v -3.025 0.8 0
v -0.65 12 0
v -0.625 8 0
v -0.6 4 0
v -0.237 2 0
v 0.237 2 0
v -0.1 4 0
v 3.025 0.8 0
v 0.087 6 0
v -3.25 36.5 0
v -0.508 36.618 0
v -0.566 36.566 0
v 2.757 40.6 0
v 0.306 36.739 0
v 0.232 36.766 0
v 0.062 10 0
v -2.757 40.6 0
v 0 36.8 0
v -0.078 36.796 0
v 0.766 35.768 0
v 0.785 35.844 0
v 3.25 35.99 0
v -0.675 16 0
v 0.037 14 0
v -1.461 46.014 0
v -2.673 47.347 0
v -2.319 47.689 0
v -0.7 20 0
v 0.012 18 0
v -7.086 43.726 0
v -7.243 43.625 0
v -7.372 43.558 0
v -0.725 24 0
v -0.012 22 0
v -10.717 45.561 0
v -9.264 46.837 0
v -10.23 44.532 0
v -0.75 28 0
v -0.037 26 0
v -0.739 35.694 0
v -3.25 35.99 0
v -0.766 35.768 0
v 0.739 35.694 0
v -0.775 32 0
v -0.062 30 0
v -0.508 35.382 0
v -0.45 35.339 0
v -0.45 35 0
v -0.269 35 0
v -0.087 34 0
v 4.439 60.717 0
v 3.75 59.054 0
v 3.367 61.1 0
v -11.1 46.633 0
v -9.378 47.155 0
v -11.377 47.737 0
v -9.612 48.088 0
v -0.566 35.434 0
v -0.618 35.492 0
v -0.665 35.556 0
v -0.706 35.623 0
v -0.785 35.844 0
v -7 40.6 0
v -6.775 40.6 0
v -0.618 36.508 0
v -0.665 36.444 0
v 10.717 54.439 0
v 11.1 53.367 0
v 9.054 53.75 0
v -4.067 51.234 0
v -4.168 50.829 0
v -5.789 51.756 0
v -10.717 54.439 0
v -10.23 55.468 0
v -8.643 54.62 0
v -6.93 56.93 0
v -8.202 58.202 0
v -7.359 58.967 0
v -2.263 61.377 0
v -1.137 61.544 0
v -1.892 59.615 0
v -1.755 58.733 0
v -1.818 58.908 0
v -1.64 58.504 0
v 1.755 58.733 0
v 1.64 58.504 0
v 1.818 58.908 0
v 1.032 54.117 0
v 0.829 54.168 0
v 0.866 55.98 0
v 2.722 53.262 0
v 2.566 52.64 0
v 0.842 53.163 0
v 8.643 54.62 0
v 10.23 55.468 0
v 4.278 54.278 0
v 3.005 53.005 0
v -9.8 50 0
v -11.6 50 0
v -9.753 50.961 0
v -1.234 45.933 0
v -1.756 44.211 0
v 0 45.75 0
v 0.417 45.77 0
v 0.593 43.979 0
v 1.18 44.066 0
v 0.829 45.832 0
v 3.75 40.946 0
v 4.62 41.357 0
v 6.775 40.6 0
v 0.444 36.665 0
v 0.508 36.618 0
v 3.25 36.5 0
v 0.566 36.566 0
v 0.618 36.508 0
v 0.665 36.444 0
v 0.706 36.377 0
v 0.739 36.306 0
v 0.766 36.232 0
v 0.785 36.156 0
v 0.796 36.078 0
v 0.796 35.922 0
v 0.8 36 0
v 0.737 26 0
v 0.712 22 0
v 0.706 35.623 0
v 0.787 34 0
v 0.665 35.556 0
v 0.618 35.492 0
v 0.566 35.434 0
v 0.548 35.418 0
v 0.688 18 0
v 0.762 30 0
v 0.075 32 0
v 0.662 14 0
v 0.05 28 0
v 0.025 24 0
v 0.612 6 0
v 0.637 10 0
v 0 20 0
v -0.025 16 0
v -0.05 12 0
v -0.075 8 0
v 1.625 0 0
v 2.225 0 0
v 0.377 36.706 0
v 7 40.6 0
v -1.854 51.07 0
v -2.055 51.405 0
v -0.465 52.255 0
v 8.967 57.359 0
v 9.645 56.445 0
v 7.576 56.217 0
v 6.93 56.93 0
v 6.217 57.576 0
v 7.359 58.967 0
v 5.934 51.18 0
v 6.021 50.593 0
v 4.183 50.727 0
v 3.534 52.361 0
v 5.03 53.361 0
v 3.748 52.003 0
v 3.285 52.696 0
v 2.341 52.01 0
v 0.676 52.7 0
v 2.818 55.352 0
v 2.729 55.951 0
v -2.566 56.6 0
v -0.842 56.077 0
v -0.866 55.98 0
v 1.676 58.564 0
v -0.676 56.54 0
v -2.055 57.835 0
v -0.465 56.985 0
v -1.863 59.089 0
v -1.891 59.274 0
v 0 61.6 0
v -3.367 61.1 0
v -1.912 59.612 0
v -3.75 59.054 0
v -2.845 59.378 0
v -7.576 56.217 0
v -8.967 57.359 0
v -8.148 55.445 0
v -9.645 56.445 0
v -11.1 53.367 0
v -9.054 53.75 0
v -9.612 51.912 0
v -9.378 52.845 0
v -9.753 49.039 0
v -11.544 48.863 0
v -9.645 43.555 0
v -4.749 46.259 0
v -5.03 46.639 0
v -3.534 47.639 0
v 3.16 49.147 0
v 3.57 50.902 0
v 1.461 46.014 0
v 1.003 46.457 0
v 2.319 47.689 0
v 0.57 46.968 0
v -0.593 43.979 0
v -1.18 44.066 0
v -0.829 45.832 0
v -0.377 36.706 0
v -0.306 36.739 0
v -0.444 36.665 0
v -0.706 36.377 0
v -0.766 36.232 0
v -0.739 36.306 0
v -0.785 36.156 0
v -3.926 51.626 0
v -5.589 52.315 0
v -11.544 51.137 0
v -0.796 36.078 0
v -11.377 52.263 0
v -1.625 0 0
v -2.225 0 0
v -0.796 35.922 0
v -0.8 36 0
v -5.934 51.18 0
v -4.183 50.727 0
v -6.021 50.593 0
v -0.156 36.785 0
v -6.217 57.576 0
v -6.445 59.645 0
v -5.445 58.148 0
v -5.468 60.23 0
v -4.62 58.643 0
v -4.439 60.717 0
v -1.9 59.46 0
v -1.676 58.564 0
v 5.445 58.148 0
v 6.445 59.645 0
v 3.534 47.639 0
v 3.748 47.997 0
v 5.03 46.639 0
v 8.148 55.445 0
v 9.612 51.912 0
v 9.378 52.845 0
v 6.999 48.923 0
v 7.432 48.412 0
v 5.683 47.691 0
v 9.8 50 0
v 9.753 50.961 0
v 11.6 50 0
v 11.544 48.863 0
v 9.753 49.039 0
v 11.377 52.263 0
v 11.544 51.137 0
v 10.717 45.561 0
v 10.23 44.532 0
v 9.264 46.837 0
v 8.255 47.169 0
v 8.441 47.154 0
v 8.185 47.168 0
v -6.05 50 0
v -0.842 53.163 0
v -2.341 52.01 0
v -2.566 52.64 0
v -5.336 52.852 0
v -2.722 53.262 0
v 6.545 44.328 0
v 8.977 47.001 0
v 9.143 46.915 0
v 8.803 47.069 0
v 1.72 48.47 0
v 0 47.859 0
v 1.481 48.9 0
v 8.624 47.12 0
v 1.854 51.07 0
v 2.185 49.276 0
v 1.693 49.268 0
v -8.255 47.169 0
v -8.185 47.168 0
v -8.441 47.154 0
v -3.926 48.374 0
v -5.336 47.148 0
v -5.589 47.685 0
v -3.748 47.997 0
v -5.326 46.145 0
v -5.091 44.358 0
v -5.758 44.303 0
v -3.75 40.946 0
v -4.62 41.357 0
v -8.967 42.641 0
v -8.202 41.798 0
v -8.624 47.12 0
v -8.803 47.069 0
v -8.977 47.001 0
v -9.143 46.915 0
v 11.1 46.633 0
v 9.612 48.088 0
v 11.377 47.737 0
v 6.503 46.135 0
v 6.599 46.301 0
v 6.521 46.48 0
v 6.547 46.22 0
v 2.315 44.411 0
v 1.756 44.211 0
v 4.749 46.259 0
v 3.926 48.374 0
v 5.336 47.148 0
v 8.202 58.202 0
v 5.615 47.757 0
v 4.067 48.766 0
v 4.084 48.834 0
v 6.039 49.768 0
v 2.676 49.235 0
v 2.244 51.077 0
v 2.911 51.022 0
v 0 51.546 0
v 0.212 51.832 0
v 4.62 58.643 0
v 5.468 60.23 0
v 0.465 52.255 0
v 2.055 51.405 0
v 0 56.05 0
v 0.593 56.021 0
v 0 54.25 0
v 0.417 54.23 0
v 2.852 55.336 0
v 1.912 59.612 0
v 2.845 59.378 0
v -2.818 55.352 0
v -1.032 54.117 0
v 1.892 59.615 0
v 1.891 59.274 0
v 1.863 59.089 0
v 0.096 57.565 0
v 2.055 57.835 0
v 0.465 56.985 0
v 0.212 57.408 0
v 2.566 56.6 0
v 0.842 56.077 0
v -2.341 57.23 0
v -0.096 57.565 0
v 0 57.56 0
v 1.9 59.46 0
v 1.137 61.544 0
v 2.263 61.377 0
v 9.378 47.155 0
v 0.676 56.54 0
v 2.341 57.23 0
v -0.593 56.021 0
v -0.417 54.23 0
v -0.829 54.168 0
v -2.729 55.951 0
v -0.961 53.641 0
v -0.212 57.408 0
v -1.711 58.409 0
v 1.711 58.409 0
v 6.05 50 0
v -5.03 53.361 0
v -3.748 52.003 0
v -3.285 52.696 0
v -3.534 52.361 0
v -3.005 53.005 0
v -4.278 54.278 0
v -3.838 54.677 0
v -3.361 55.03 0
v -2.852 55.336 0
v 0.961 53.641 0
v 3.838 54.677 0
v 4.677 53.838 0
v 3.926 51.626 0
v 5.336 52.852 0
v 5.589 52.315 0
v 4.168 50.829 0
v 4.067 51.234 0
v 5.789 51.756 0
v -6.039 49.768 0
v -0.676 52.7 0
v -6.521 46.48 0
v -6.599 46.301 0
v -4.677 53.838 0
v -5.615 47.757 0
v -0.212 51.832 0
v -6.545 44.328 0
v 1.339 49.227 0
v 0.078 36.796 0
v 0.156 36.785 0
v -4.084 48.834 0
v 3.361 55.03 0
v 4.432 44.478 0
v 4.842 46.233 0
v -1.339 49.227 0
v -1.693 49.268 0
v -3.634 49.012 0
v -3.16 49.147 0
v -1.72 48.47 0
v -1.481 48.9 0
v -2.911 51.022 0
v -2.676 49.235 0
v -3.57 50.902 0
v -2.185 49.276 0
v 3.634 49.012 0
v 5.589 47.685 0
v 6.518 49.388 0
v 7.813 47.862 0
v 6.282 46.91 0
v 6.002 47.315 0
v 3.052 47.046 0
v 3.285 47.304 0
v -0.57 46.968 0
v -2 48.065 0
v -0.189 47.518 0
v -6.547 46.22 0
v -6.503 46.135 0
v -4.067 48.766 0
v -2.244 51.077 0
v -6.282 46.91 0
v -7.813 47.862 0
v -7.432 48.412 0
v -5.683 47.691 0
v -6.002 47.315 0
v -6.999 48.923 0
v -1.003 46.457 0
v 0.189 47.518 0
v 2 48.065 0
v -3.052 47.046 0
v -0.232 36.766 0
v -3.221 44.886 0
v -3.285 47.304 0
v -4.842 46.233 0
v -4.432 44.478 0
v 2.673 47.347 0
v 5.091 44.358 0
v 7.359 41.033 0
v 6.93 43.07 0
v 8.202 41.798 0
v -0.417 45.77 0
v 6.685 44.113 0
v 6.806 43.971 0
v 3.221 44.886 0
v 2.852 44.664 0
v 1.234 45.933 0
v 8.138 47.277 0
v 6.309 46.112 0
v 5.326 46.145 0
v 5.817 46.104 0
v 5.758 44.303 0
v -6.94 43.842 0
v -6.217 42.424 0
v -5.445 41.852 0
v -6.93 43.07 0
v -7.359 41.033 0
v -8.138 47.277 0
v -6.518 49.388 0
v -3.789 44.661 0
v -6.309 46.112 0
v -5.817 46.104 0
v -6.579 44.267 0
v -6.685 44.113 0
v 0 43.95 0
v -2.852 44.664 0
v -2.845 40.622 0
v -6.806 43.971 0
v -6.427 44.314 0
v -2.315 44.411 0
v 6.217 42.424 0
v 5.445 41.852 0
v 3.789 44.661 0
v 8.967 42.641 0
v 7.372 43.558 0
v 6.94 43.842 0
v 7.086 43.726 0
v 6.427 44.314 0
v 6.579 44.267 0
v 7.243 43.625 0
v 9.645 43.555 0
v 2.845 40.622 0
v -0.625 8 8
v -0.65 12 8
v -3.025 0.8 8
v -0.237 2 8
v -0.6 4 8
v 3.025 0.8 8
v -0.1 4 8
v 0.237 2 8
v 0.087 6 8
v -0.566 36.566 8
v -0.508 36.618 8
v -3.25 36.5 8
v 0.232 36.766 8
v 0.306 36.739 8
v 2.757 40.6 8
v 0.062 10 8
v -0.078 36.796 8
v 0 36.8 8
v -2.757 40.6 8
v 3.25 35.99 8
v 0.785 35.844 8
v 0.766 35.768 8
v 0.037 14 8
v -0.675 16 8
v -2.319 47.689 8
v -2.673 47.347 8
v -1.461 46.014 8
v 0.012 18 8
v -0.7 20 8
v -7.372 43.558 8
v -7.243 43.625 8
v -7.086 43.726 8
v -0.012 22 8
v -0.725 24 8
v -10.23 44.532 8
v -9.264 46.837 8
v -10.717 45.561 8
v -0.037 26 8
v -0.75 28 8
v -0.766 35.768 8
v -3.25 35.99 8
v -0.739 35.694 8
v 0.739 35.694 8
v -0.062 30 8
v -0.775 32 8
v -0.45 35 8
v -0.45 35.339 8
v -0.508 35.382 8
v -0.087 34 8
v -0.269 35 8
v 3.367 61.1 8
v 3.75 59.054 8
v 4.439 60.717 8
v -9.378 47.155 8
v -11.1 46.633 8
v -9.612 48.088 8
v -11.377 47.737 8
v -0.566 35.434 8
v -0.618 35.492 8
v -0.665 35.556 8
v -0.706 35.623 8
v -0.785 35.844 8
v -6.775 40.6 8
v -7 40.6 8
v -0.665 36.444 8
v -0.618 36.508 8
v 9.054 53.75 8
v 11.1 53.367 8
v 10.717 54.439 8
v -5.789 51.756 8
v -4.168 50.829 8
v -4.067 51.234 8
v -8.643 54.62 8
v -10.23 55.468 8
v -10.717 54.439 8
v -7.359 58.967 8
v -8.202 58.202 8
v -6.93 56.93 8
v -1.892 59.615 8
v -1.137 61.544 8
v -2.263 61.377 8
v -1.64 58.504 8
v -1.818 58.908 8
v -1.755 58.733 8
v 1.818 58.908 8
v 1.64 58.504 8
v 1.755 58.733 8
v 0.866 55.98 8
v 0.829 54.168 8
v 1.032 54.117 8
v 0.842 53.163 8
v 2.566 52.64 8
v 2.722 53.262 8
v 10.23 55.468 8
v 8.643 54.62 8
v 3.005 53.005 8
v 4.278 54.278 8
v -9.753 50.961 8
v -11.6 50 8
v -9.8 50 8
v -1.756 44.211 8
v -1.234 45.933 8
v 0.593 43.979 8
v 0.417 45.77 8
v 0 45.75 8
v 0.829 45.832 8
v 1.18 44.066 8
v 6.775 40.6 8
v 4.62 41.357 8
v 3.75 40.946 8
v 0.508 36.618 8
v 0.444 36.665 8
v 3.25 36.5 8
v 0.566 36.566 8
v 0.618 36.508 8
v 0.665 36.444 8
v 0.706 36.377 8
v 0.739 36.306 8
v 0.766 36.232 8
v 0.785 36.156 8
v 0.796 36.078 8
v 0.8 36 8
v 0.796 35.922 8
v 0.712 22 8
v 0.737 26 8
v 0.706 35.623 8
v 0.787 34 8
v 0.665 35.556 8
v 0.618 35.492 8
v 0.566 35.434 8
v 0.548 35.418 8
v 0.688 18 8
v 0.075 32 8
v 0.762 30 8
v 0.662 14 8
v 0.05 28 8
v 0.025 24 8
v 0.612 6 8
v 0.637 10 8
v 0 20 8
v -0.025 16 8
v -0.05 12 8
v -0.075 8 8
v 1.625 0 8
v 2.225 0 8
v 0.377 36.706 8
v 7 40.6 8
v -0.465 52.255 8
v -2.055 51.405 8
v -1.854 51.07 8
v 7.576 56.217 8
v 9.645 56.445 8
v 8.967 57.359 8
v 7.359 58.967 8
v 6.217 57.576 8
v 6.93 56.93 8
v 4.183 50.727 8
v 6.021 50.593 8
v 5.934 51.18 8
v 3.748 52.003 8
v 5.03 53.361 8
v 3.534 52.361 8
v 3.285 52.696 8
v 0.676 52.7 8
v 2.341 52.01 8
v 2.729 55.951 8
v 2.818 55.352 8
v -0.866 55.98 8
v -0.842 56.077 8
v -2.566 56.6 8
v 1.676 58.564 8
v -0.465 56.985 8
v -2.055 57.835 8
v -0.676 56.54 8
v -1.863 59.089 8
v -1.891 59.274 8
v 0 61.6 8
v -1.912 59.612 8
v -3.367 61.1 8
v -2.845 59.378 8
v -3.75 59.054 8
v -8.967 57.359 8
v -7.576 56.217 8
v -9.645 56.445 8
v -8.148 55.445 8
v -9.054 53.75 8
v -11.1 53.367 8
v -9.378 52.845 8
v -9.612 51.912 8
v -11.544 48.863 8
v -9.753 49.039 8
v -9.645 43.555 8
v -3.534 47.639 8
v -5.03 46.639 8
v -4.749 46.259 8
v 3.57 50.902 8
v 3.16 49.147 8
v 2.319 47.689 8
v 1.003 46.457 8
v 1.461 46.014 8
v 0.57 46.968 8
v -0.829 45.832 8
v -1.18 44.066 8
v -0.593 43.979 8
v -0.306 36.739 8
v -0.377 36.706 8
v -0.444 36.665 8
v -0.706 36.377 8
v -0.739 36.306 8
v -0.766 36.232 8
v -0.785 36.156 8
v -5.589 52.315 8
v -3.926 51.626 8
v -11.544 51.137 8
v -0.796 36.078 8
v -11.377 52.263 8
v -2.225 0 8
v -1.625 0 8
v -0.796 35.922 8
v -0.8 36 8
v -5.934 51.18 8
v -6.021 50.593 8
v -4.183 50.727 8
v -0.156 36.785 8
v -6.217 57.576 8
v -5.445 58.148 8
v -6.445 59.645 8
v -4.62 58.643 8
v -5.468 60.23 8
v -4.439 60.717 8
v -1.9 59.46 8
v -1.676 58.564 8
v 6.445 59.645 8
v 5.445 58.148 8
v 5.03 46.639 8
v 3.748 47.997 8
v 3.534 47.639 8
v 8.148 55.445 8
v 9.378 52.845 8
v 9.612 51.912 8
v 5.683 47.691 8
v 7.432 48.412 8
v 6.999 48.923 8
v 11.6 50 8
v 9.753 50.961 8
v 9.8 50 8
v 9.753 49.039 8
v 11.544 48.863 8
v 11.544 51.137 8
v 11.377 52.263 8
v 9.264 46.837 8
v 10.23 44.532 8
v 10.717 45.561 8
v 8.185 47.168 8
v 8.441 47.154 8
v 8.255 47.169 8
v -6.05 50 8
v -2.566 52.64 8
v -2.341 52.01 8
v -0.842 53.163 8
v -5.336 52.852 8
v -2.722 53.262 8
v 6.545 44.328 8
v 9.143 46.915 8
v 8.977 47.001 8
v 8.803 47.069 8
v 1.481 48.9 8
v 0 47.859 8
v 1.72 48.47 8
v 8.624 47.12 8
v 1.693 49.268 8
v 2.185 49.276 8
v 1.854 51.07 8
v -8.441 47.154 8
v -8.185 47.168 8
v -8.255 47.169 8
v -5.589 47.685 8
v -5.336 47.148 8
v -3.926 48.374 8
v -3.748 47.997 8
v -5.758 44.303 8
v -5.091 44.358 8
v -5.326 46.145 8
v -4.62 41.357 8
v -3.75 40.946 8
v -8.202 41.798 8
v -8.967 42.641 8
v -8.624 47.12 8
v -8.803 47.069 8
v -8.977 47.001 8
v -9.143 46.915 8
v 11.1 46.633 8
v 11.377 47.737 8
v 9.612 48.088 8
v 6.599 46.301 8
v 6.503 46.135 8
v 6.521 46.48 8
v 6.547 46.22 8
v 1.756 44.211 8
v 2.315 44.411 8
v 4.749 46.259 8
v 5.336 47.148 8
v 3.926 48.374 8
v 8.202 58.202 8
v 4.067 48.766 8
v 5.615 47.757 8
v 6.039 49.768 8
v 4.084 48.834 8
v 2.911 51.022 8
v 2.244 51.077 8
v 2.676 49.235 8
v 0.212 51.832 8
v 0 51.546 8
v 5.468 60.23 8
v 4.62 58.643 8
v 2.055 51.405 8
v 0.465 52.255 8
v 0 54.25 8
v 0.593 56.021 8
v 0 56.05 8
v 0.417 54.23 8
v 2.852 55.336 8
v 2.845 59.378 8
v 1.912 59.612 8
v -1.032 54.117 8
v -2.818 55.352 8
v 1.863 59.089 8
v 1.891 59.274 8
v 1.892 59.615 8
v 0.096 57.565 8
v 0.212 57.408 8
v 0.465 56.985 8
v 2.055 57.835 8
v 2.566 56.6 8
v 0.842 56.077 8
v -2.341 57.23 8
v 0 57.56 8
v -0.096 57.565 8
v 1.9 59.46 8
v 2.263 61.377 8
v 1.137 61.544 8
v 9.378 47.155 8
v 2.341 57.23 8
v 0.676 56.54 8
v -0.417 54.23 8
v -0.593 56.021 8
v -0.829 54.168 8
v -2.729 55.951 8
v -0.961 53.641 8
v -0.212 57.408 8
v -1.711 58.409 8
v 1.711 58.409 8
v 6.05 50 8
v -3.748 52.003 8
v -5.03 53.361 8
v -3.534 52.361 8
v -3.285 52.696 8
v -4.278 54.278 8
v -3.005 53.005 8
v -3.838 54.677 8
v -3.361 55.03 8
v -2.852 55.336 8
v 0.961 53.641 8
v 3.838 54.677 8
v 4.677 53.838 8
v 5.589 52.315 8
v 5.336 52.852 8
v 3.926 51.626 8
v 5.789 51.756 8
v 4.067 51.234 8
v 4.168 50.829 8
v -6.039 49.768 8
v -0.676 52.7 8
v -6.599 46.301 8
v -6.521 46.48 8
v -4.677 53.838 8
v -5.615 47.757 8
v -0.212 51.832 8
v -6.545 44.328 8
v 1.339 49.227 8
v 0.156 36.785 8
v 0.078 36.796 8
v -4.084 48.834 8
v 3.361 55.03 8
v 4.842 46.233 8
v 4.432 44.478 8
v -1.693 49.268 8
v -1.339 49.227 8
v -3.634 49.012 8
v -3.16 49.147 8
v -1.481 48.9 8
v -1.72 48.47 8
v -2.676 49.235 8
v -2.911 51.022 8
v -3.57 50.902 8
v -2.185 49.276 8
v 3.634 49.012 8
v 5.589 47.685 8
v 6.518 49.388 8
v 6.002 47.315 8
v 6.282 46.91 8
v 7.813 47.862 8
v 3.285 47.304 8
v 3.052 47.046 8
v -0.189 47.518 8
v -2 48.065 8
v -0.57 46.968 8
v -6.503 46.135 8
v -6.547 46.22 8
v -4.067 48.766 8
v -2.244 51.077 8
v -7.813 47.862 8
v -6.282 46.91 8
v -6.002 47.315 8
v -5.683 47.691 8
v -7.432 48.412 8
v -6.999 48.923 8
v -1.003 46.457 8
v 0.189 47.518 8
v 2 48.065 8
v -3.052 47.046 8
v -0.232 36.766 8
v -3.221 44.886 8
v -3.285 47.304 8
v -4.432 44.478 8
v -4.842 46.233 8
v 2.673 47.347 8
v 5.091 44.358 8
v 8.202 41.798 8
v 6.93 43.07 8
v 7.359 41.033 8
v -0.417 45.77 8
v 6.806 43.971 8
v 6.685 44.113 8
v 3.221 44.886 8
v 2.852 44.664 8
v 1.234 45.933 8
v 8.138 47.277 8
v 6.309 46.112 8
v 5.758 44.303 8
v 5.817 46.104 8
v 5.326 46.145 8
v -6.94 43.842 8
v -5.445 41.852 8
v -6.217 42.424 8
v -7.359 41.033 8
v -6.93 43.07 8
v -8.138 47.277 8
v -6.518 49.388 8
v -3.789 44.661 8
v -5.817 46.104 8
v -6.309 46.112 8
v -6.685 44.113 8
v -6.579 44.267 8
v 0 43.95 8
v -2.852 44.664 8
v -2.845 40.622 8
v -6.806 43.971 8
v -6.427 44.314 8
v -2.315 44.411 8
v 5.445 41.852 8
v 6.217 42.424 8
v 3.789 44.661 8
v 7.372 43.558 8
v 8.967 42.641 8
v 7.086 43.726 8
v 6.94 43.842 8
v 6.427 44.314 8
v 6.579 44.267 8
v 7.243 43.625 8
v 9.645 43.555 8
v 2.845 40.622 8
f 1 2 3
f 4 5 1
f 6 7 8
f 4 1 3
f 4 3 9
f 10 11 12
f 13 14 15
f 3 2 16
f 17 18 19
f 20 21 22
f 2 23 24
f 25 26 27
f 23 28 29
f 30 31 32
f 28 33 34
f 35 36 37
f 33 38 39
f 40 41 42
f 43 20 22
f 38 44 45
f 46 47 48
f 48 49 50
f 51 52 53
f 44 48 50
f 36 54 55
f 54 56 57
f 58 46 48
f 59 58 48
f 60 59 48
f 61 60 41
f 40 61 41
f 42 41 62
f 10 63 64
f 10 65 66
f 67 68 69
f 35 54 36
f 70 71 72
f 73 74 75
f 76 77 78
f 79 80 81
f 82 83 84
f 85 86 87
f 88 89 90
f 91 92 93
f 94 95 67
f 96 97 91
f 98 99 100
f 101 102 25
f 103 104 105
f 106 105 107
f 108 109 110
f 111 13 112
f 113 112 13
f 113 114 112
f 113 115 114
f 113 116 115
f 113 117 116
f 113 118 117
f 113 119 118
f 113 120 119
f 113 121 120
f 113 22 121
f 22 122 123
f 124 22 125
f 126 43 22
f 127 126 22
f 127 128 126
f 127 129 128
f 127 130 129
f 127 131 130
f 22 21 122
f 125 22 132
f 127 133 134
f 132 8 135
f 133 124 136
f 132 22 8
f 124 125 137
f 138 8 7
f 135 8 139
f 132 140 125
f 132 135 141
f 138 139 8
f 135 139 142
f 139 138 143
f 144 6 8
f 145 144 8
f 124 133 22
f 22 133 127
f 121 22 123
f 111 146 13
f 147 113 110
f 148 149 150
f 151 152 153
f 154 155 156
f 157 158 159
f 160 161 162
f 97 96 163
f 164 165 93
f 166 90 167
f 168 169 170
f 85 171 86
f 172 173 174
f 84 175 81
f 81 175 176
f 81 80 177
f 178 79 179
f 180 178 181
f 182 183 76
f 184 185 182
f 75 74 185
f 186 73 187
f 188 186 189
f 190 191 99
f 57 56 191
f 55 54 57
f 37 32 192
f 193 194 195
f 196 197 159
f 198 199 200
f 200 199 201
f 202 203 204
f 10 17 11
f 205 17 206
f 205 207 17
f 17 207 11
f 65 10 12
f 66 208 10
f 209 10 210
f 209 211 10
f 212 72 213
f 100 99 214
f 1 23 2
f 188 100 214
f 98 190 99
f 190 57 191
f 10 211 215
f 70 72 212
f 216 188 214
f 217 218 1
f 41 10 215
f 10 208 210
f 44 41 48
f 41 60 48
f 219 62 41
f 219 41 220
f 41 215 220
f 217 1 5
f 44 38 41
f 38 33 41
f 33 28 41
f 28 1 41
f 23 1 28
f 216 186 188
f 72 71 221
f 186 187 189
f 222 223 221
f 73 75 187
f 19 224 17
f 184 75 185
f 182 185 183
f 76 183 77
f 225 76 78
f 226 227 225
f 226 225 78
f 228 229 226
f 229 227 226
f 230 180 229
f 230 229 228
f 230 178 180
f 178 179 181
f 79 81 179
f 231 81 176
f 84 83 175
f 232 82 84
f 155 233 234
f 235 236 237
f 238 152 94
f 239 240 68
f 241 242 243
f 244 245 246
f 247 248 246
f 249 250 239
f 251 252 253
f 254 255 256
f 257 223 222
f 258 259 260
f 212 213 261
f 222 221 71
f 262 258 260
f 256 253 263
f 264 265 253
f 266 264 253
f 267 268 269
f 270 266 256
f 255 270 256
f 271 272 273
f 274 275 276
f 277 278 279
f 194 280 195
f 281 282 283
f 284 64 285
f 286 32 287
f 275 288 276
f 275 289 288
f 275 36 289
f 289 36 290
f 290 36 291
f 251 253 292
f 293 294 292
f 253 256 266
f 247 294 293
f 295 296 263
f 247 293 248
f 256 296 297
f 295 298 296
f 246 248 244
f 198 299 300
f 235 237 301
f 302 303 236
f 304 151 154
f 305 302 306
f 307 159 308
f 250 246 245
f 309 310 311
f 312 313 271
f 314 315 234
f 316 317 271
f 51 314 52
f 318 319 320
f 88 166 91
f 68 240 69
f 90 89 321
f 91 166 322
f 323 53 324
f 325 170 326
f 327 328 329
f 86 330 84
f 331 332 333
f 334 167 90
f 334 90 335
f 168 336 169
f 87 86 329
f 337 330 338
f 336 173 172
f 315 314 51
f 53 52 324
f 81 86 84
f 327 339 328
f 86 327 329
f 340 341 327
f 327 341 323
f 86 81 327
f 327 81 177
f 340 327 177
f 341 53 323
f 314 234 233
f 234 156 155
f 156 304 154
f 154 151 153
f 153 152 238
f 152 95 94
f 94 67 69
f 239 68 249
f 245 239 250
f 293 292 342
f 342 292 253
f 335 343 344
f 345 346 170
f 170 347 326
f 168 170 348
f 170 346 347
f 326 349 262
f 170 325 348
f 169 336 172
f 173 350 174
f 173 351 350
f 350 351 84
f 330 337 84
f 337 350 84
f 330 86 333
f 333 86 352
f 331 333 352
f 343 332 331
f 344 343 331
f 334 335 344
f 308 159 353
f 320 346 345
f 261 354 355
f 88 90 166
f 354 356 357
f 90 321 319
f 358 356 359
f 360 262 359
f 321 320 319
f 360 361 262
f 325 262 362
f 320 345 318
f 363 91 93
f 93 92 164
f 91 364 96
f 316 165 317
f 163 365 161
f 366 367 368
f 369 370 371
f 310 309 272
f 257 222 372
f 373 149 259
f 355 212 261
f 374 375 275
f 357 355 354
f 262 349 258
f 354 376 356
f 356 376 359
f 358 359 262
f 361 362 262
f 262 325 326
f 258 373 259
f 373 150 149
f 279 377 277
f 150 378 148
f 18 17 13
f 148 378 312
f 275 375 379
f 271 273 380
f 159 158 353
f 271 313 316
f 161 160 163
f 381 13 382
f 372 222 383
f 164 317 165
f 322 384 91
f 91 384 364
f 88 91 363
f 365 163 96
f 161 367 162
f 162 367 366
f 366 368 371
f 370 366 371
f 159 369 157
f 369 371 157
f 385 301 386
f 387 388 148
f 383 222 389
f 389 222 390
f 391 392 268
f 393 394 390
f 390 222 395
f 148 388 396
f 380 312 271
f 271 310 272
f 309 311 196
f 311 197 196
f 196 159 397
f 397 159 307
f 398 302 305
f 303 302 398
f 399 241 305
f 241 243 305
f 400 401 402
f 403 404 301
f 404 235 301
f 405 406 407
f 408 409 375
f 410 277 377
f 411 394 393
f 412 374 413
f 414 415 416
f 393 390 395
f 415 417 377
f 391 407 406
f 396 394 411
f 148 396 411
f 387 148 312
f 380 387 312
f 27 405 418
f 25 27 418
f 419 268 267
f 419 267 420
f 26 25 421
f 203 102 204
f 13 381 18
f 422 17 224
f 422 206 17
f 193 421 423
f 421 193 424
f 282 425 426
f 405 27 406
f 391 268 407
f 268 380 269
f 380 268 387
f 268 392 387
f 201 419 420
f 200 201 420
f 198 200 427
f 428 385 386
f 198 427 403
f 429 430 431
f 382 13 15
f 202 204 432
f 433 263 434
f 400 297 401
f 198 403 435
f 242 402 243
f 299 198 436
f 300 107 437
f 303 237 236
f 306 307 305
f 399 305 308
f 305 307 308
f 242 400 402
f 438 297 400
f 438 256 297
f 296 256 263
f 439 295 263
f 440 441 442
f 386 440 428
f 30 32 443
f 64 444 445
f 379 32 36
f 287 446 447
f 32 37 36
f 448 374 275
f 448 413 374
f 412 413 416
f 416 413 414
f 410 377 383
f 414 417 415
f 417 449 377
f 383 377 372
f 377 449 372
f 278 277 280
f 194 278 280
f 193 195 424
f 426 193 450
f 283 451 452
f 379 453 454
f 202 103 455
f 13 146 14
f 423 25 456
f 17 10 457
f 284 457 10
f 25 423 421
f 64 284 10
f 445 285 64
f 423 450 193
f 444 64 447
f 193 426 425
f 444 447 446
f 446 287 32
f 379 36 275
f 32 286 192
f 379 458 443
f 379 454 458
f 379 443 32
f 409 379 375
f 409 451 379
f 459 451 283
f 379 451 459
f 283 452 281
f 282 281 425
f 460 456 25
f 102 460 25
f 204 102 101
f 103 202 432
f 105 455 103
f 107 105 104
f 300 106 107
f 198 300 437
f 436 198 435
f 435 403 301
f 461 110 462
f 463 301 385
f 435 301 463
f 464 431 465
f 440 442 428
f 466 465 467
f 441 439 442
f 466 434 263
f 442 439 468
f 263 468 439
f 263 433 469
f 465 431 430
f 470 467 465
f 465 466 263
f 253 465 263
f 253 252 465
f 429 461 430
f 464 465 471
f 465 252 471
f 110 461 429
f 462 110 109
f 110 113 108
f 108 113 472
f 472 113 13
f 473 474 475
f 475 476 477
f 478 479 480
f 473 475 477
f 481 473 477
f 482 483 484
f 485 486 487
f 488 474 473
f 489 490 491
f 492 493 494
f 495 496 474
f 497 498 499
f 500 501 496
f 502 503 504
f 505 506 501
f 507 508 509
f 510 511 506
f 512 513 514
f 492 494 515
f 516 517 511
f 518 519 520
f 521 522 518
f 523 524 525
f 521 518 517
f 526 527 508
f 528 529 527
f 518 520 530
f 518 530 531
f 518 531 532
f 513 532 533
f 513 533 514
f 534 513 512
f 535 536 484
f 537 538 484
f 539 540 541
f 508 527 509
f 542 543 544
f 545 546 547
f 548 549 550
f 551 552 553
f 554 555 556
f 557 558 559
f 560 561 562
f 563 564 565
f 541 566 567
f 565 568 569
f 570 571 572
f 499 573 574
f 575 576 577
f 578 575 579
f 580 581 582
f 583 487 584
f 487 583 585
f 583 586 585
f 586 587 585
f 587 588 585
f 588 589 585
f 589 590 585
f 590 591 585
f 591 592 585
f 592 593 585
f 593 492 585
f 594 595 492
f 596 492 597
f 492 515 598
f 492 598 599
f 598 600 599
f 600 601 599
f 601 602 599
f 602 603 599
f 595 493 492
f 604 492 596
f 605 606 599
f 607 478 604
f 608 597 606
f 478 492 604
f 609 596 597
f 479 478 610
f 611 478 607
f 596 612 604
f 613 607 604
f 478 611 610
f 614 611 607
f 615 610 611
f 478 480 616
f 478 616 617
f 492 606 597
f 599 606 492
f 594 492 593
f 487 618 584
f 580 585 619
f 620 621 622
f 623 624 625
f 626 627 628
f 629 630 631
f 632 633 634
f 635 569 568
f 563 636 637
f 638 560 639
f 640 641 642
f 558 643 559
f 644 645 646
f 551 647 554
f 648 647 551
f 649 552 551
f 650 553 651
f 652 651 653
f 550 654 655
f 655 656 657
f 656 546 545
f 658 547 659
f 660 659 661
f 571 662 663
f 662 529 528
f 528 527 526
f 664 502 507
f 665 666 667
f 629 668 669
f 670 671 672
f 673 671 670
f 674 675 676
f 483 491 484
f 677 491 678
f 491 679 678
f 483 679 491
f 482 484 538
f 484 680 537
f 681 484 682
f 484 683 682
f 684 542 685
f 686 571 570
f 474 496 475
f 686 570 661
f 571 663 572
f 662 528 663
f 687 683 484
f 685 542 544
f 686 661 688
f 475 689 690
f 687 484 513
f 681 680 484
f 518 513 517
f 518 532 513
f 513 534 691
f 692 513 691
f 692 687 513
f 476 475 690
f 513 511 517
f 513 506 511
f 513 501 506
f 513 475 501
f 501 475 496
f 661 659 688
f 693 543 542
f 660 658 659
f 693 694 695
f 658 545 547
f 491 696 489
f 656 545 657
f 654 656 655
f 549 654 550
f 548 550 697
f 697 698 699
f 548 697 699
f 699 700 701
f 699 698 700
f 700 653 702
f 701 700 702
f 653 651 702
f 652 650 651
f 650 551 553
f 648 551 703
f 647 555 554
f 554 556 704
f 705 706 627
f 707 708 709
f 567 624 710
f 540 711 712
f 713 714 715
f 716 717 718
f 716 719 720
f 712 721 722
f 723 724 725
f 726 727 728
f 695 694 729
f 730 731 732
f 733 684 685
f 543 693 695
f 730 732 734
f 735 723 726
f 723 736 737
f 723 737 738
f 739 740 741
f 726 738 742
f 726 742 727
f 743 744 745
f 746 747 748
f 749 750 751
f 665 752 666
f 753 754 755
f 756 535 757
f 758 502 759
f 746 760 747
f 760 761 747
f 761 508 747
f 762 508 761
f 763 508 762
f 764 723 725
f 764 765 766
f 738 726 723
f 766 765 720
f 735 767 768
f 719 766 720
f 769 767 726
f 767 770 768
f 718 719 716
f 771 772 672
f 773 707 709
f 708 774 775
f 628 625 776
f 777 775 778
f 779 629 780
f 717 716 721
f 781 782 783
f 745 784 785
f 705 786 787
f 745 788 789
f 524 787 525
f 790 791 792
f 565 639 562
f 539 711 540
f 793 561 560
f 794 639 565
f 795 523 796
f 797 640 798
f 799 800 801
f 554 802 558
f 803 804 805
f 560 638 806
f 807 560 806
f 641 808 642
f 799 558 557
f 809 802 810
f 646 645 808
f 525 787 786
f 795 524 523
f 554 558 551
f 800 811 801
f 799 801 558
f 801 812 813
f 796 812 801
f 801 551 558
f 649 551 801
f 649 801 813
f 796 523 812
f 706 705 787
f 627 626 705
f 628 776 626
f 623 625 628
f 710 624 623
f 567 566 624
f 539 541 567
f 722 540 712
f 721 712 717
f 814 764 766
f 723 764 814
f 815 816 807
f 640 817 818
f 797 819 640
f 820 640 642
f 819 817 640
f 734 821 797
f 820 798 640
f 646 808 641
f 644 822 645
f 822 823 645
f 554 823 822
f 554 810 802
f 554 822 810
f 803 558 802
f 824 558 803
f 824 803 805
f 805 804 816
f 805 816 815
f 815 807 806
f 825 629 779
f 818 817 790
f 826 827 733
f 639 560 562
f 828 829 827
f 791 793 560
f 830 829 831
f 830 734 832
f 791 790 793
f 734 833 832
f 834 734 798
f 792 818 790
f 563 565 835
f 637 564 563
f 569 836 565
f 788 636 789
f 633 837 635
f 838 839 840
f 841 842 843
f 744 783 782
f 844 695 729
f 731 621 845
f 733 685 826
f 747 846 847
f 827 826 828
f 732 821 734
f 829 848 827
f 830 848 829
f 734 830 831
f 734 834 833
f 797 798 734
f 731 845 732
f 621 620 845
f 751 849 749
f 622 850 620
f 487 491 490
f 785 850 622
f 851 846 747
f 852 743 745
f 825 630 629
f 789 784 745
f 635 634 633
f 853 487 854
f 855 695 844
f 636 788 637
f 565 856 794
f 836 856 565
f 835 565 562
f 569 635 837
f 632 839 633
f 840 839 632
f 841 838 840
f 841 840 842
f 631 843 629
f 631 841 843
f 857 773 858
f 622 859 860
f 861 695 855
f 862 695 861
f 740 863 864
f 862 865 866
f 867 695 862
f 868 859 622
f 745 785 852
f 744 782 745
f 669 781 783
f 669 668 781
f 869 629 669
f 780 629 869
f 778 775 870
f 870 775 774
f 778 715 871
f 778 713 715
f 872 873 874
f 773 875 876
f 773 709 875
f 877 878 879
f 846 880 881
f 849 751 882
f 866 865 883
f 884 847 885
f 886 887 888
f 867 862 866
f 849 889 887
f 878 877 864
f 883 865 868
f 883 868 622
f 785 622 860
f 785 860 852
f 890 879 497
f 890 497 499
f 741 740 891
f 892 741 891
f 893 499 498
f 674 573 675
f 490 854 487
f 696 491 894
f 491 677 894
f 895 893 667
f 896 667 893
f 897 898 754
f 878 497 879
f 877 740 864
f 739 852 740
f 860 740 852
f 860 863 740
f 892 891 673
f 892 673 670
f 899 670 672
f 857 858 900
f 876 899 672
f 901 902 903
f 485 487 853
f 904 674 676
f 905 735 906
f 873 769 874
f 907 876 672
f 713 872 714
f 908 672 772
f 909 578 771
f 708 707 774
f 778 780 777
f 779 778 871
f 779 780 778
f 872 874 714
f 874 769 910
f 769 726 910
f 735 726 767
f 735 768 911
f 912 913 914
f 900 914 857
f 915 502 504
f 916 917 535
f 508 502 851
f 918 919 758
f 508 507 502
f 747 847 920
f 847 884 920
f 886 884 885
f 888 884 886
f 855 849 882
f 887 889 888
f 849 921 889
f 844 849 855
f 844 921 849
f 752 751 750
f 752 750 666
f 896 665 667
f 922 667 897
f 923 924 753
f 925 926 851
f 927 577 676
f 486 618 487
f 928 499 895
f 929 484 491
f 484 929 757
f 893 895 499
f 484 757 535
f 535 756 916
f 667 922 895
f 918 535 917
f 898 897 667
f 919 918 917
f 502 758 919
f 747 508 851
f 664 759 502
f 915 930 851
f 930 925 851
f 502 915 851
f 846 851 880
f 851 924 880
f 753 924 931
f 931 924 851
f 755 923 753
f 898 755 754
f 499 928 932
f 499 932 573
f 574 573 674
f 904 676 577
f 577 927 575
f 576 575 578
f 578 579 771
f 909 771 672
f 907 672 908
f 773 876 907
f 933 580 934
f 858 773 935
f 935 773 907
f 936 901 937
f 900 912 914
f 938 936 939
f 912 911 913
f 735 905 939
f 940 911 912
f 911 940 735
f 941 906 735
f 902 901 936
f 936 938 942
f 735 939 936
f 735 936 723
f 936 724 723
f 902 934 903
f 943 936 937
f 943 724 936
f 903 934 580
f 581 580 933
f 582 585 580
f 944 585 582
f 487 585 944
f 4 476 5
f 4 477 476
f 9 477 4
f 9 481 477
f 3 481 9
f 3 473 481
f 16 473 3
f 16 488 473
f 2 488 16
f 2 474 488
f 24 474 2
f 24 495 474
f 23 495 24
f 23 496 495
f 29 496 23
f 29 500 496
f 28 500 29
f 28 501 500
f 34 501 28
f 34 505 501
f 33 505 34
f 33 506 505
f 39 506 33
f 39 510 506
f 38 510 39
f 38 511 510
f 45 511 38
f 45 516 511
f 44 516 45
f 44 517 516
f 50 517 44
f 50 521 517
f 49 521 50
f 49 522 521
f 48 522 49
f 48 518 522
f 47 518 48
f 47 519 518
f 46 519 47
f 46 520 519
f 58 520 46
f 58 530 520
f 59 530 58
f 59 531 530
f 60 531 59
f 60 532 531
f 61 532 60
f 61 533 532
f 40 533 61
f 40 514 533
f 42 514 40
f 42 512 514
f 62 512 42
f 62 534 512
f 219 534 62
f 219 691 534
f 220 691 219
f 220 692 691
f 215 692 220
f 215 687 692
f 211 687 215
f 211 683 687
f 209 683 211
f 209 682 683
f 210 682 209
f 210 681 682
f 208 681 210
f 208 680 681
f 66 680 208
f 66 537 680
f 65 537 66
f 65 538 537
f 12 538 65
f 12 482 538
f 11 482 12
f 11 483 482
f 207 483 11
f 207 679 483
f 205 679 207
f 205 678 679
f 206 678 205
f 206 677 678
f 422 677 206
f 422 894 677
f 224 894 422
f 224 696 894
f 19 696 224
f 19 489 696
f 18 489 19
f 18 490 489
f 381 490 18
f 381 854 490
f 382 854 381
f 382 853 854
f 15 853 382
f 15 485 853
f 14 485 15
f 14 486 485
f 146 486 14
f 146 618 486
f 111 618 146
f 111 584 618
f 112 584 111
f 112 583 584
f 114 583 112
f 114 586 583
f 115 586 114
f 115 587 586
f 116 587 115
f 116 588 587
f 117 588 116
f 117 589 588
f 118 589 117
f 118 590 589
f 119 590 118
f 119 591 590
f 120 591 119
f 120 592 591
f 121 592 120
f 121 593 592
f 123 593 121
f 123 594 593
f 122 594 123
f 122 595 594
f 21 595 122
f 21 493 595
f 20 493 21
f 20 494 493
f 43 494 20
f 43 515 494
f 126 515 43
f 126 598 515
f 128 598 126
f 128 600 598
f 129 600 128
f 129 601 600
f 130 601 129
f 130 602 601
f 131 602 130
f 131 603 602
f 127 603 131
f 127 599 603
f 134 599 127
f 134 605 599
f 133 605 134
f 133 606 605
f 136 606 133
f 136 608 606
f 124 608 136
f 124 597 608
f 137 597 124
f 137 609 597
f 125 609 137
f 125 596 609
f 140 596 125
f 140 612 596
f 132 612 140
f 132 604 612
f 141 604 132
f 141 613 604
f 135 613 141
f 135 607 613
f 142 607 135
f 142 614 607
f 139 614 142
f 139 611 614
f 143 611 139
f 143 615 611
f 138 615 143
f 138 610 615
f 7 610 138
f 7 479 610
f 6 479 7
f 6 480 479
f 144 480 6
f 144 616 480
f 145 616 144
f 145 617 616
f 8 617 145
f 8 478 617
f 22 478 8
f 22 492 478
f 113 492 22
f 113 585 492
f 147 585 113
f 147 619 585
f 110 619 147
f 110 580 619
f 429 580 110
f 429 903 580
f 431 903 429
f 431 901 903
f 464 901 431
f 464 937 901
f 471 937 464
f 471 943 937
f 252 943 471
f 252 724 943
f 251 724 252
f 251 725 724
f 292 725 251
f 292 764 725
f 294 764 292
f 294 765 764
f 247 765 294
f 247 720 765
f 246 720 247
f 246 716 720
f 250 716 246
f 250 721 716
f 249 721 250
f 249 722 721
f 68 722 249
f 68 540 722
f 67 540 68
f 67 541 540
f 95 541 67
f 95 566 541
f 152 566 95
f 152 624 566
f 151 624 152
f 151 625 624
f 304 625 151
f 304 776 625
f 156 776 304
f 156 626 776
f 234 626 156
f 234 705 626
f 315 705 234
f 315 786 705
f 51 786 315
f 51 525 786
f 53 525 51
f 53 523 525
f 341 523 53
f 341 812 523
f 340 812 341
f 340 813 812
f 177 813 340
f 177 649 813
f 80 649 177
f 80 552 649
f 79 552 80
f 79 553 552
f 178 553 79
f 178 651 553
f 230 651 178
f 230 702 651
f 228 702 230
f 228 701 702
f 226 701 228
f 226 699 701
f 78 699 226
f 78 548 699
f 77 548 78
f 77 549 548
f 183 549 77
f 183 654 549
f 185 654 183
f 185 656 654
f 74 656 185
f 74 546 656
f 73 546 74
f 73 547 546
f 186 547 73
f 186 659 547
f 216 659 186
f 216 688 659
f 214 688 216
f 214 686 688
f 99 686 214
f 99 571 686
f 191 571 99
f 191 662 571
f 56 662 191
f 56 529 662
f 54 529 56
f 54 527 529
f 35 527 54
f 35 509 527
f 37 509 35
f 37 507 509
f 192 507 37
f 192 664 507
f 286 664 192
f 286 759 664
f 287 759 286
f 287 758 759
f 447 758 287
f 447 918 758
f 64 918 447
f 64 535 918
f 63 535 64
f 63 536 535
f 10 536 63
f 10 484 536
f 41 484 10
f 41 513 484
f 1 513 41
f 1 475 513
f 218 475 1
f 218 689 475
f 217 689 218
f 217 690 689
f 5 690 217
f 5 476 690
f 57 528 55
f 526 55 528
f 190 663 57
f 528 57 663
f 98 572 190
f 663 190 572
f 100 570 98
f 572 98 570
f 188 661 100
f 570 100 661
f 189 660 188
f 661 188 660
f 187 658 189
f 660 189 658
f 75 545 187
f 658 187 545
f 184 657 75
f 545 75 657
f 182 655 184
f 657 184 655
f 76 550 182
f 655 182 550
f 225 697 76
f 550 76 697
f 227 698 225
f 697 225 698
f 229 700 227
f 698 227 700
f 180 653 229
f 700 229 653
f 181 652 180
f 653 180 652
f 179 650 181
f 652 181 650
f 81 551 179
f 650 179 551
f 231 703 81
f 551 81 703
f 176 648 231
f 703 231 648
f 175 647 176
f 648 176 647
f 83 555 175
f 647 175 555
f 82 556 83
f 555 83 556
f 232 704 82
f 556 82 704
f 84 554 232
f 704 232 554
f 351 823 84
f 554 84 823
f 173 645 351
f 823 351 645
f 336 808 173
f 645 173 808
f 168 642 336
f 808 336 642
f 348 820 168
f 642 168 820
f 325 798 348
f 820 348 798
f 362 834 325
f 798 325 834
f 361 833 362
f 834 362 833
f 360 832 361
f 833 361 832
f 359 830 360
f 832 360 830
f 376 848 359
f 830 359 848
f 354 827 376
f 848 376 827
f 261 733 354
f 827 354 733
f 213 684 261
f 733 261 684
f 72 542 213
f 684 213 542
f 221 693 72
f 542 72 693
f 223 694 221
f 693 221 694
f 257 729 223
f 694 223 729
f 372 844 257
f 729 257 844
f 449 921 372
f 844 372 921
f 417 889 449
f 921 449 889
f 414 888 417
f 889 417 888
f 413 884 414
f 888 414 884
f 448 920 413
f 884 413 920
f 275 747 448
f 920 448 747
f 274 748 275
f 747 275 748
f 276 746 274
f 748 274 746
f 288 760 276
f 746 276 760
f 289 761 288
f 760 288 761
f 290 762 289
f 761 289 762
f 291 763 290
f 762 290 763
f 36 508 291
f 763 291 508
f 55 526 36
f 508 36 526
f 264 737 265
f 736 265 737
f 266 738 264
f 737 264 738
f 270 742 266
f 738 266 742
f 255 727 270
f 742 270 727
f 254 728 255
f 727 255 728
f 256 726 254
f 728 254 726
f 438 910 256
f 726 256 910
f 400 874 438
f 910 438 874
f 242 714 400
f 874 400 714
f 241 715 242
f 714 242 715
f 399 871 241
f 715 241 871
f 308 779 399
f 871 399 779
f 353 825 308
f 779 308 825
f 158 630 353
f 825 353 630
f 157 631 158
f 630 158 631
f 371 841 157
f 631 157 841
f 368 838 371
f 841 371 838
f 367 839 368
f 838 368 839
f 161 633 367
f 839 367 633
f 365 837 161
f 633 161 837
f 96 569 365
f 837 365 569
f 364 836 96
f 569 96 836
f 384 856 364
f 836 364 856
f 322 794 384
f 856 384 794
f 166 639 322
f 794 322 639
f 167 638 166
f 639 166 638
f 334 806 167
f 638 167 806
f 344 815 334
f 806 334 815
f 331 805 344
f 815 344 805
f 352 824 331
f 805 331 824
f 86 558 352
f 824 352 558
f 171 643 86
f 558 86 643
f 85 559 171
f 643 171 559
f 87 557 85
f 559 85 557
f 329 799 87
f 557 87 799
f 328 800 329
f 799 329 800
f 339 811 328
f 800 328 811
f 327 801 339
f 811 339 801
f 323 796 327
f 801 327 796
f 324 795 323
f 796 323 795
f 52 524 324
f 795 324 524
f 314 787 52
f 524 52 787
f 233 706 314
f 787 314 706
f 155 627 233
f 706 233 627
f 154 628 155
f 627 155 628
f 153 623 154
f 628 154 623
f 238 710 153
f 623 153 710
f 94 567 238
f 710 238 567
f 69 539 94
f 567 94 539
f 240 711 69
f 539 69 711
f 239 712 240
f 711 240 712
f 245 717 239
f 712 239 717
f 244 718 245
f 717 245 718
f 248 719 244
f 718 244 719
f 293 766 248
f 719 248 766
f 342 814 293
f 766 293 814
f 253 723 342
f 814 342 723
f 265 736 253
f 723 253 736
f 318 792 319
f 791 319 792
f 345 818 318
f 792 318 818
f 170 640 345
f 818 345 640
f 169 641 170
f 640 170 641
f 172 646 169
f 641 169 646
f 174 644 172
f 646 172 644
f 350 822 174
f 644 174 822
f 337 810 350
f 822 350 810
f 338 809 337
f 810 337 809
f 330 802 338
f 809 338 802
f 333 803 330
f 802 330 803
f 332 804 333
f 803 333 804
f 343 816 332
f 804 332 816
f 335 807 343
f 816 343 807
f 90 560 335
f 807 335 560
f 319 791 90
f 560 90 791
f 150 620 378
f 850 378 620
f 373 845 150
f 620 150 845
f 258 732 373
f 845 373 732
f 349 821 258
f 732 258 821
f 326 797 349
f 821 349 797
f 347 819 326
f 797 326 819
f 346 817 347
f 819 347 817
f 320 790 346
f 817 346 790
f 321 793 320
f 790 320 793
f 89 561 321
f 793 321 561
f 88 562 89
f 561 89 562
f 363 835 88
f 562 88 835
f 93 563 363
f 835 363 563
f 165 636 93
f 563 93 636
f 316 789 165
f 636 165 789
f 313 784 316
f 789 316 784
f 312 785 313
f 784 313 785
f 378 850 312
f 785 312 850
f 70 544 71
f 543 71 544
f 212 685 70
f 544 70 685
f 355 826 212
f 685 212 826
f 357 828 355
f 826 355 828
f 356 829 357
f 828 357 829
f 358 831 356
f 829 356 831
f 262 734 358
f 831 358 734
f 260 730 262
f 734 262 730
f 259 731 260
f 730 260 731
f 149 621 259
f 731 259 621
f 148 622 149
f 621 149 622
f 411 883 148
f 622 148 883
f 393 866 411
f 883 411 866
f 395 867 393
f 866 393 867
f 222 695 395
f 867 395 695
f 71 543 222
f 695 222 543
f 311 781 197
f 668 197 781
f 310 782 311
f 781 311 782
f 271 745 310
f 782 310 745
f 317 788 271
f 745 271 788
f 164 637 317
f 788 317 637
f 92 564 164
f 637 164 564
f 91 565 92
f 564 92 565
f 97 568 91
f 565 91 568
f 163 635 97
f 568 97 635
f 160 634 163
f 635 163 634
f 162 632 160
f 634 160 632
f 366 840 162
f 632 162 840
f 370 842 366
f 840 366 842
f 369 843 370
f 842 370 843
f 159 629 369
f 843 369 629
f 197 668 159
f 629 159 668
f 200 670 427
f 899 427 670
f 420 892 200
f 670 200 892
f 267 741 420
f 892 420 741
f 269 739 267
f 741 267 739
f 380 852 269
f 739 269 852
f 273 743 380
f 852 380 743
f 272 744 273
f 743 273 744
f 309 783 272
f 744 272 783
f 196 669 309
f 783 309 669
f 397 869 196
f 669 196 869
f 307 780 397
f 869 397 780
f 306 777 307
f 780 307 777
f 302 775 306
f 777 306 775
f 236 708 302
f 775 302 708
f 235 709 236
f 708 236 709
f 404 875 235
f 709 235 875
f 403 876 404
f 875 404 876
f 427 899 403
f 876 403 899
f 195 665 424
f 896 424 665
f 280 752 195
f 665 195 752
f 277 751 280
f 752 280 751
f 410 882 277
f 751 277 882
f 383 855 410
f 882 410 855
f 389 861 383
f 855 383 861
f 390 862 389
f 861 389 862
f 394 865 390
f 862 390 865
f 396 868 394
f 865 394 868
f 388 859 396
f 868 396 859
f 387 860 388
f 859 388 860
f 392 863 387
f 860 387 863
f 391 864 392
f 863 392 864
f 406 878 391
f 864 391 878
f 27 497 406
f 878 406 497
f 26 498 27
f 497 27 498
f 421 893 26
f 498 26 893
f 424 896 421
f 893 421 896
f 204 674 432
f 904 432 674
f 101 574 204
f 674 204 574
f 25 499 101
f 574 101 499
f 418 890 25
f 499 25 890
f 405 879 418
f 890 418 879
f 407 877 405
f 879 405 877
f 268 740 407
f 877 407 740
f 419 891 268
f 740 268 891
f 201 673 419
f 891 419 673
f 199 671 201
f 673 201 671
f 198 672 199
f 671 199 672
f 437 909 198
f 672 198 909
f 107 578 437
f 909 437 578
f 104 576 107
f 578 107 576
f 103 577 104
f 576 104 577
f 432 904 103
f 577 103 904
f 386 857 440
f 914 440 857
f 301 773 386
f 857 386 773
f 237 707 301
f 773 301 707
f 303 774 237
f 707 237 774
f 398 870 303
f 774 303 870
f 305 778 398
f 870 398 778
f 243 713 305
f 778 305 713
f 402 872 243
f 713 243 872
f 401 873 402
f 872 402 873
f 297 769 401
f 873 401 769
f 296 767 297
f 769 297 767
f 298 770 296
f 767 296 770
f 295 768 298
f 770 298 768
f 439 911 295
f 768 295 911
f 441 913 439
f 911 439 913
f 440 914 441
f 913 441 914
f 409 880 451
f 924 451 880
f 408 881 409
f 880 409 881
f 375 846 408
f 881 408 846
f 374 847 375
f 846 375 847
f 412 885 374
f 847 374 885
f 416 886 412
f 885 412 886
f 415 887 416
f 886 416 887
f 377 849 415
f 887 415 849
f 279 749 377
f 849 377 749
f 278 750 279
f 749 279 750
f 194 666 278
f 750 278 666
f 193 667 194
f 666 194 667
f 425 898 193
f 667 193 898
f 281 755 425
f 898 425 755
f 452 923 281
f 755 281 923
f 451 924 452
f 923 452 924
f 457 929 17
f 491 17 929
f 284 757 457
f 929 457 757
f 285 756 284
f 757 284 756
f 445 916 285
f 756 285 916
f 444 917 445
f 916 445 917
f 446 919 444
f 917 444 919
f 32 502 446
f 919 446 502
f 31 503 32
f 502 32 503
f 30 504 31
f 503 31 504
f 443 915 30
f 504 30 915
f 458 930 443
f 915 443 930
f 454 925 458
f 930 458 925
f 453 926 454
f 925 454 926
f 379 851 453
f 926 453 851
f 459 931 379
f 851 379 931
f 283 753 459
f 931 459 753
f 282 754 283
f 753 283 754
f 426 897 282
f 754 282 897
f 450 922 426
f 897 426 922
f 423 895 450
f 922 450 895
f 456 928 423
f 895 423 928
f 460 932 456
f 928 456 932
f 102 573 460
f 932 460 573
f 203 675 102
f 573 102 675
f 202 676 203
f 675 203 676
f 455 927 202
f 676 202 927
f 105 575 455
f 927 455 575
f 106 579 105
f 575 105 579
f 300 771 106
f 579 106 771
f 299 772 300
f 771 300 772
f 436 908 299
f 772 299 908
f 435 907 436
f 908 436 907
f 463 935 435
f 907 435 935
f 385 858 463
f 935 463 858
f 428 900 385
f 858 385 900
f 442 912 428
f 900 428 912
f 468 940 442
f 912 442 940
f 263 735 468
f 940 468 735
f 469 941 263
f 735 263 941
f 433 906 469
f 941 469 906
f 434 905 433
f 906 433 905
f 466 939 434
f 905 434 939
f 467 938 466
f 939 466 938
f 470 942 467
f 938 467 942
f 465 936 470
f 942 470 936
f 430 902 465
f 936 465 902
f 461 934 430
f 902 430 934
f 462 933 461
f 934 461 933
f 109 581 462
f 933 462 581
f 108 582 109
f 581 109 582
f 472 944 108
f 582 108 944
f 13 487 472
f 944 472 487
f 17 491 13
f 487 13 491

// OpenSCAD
// Ornate slide-on bag clip (2026-11-12, V2 built in). Upside-down U like a bread tag but for any
// bag: fold or twist the bag top, push the clip down over it. No hinge, no latch, ~25 min on the Ender.
// - Prongs converge (0.9 mm gap at the root -> 0.45 at the tips; tighter fuses when printing): they spring apart on the bag.
// - Interlocking teeth inside: the bag runs in a zigzag and can't slide out.
// - Flared tips = lead-in, stress-relief hole at the root so the U flexes instead of cracking.
// - Head: Norse triquetra with a ring, tips welded into the ring + flared neck (load path, not decoration only) (house style, like the rattle); doubles as pull grip + hang loop.
// - Optional braid chevrons on the outer faces (braid_on; off = fast).
// Prints flat (profile in XY), no supports. PETG.
//   p3d slice bag_slide_clip.stl --walls 3 --infill 40 --keep-orient   (solid prongs)
$fn = 64;
braid_on = false;   // engraved braid on the outer faces: +10 min per clip
part = "one";     // "one" | "set" (4 on a plate)
H   = 8;          // clip height (print Z) = grip width on the bag
Lp  = 36;         // prong length
p   = 2.8;        // prong thickness
g0  = 0.9;        // gap at the root
g1  = 0.45;       // gap at the tips
th  = 0.7;        // tooth height
tp  = 4;          // tooth pitch
R   = 11;         // triquetra outer size
lw  = 1.8;        // knot line width

// prong i = -1 (left) / +1 (right). Both inner faces follow one zigzag centre line, so the gap
// is a wavy channel g1..g0 wide; the bag is bent around every tooth.
ix = function(y) (g1 + (g0 - g1) * y / Lp) / 2;
cz = function(k) (k % 2 == 0 ? 1 : -1) * th / 2;
n  = floor((Lp - 3) / (tp / 2));
module prong(i) {
  inner = [for (k = [1 : n]) let(y = 2 + k * tp / 2) [cz(k) + i * ix(y), y]];
  polygon(concat(
    [[i * (ix(0) + 1.4), 0], [i * ix(2), 2]],             // flared tip (lead-in)
    inner,
    [[i * ix(Lp), Lp], [i * (ix(Lp) + p), Lp], [i * (ix(0) + p), 0.8], [i * (ix(0) + p - 0.8), 0]]));
}

module vesica(r, d) intersection() { translate([-d, 0]) circle(r); translate([d, 0]) circle(r); }

module triquetra() {
  r = R * 0.62; d = R * 0.36;
  for (a = [90, 210, 330]) rotate(a) translate([R * 0.42, 0]) rotate(90)
    difference() { vesica(r, d); offset(-lw) vesica(r, d); }
  difference() { circle(R * 0.55); circle(R * 0.55 - lw); }
}

module profile() {
  difference() {
    union() {
      prong(-1); prong(1);
      // root block joining the prongs
      translate([-(g0 / 2 + p), Lp - 0.01]) square([g0 + 2 * p, 4]);
      // flared neck: spreads pull/twist load from the prongs into the ring
      polygon([[-(g0 / 2 + p), Lp + 0.5], [g0 / 2 + p, Lp + 0.5], [7, Lp + 4.6], [-7, Lp + 4.6]]);
      // neck + head
      translate([0, Lp + 3 + R]) {
        triquetra();
        difference() { circle(R + 0.6); circle(R + 0.6 - lw); }   // outer ring
        // welds: each knot tip fused into the ring over ~4 mm, not a tangent touch
        for (a = [90, 210, 330]) rotate(a) translate([R * 0.86, 0]) circle(d = 3.8);
      }
    }
    translate([0, Lp]) circle(d = 1.6);   // stress relief at the root of the slot
    translate([-g0 / 2, Lp - 1]) square([g0, 1]);
  }
}

// braid chevrons on an outer face (x = xo, facing +x if i = 1)
module braid(i) {
  xo = i * (g1 / 2 + p);
  for (y = [4 : 4.5 : Lp - 3], s = [-1, 1])
    translate([xo, y, H / 2]) rotate([0, 0, 0]) rotate([s * 40, 0, 0])
      cube([1.0, 0.8, H * 1.6], center = true);
}

module clip() {
  difference() {
    linear_extrude(H) profile();
    if (braid_on) { braid(-1); braid(1); }
    // keep the chevrons off the top/bottom edges
  }
}

if (part == "one") clip();
else for (i = [0:3]) translate([(i - 1.5) * 30, 0, 0]) clip();
